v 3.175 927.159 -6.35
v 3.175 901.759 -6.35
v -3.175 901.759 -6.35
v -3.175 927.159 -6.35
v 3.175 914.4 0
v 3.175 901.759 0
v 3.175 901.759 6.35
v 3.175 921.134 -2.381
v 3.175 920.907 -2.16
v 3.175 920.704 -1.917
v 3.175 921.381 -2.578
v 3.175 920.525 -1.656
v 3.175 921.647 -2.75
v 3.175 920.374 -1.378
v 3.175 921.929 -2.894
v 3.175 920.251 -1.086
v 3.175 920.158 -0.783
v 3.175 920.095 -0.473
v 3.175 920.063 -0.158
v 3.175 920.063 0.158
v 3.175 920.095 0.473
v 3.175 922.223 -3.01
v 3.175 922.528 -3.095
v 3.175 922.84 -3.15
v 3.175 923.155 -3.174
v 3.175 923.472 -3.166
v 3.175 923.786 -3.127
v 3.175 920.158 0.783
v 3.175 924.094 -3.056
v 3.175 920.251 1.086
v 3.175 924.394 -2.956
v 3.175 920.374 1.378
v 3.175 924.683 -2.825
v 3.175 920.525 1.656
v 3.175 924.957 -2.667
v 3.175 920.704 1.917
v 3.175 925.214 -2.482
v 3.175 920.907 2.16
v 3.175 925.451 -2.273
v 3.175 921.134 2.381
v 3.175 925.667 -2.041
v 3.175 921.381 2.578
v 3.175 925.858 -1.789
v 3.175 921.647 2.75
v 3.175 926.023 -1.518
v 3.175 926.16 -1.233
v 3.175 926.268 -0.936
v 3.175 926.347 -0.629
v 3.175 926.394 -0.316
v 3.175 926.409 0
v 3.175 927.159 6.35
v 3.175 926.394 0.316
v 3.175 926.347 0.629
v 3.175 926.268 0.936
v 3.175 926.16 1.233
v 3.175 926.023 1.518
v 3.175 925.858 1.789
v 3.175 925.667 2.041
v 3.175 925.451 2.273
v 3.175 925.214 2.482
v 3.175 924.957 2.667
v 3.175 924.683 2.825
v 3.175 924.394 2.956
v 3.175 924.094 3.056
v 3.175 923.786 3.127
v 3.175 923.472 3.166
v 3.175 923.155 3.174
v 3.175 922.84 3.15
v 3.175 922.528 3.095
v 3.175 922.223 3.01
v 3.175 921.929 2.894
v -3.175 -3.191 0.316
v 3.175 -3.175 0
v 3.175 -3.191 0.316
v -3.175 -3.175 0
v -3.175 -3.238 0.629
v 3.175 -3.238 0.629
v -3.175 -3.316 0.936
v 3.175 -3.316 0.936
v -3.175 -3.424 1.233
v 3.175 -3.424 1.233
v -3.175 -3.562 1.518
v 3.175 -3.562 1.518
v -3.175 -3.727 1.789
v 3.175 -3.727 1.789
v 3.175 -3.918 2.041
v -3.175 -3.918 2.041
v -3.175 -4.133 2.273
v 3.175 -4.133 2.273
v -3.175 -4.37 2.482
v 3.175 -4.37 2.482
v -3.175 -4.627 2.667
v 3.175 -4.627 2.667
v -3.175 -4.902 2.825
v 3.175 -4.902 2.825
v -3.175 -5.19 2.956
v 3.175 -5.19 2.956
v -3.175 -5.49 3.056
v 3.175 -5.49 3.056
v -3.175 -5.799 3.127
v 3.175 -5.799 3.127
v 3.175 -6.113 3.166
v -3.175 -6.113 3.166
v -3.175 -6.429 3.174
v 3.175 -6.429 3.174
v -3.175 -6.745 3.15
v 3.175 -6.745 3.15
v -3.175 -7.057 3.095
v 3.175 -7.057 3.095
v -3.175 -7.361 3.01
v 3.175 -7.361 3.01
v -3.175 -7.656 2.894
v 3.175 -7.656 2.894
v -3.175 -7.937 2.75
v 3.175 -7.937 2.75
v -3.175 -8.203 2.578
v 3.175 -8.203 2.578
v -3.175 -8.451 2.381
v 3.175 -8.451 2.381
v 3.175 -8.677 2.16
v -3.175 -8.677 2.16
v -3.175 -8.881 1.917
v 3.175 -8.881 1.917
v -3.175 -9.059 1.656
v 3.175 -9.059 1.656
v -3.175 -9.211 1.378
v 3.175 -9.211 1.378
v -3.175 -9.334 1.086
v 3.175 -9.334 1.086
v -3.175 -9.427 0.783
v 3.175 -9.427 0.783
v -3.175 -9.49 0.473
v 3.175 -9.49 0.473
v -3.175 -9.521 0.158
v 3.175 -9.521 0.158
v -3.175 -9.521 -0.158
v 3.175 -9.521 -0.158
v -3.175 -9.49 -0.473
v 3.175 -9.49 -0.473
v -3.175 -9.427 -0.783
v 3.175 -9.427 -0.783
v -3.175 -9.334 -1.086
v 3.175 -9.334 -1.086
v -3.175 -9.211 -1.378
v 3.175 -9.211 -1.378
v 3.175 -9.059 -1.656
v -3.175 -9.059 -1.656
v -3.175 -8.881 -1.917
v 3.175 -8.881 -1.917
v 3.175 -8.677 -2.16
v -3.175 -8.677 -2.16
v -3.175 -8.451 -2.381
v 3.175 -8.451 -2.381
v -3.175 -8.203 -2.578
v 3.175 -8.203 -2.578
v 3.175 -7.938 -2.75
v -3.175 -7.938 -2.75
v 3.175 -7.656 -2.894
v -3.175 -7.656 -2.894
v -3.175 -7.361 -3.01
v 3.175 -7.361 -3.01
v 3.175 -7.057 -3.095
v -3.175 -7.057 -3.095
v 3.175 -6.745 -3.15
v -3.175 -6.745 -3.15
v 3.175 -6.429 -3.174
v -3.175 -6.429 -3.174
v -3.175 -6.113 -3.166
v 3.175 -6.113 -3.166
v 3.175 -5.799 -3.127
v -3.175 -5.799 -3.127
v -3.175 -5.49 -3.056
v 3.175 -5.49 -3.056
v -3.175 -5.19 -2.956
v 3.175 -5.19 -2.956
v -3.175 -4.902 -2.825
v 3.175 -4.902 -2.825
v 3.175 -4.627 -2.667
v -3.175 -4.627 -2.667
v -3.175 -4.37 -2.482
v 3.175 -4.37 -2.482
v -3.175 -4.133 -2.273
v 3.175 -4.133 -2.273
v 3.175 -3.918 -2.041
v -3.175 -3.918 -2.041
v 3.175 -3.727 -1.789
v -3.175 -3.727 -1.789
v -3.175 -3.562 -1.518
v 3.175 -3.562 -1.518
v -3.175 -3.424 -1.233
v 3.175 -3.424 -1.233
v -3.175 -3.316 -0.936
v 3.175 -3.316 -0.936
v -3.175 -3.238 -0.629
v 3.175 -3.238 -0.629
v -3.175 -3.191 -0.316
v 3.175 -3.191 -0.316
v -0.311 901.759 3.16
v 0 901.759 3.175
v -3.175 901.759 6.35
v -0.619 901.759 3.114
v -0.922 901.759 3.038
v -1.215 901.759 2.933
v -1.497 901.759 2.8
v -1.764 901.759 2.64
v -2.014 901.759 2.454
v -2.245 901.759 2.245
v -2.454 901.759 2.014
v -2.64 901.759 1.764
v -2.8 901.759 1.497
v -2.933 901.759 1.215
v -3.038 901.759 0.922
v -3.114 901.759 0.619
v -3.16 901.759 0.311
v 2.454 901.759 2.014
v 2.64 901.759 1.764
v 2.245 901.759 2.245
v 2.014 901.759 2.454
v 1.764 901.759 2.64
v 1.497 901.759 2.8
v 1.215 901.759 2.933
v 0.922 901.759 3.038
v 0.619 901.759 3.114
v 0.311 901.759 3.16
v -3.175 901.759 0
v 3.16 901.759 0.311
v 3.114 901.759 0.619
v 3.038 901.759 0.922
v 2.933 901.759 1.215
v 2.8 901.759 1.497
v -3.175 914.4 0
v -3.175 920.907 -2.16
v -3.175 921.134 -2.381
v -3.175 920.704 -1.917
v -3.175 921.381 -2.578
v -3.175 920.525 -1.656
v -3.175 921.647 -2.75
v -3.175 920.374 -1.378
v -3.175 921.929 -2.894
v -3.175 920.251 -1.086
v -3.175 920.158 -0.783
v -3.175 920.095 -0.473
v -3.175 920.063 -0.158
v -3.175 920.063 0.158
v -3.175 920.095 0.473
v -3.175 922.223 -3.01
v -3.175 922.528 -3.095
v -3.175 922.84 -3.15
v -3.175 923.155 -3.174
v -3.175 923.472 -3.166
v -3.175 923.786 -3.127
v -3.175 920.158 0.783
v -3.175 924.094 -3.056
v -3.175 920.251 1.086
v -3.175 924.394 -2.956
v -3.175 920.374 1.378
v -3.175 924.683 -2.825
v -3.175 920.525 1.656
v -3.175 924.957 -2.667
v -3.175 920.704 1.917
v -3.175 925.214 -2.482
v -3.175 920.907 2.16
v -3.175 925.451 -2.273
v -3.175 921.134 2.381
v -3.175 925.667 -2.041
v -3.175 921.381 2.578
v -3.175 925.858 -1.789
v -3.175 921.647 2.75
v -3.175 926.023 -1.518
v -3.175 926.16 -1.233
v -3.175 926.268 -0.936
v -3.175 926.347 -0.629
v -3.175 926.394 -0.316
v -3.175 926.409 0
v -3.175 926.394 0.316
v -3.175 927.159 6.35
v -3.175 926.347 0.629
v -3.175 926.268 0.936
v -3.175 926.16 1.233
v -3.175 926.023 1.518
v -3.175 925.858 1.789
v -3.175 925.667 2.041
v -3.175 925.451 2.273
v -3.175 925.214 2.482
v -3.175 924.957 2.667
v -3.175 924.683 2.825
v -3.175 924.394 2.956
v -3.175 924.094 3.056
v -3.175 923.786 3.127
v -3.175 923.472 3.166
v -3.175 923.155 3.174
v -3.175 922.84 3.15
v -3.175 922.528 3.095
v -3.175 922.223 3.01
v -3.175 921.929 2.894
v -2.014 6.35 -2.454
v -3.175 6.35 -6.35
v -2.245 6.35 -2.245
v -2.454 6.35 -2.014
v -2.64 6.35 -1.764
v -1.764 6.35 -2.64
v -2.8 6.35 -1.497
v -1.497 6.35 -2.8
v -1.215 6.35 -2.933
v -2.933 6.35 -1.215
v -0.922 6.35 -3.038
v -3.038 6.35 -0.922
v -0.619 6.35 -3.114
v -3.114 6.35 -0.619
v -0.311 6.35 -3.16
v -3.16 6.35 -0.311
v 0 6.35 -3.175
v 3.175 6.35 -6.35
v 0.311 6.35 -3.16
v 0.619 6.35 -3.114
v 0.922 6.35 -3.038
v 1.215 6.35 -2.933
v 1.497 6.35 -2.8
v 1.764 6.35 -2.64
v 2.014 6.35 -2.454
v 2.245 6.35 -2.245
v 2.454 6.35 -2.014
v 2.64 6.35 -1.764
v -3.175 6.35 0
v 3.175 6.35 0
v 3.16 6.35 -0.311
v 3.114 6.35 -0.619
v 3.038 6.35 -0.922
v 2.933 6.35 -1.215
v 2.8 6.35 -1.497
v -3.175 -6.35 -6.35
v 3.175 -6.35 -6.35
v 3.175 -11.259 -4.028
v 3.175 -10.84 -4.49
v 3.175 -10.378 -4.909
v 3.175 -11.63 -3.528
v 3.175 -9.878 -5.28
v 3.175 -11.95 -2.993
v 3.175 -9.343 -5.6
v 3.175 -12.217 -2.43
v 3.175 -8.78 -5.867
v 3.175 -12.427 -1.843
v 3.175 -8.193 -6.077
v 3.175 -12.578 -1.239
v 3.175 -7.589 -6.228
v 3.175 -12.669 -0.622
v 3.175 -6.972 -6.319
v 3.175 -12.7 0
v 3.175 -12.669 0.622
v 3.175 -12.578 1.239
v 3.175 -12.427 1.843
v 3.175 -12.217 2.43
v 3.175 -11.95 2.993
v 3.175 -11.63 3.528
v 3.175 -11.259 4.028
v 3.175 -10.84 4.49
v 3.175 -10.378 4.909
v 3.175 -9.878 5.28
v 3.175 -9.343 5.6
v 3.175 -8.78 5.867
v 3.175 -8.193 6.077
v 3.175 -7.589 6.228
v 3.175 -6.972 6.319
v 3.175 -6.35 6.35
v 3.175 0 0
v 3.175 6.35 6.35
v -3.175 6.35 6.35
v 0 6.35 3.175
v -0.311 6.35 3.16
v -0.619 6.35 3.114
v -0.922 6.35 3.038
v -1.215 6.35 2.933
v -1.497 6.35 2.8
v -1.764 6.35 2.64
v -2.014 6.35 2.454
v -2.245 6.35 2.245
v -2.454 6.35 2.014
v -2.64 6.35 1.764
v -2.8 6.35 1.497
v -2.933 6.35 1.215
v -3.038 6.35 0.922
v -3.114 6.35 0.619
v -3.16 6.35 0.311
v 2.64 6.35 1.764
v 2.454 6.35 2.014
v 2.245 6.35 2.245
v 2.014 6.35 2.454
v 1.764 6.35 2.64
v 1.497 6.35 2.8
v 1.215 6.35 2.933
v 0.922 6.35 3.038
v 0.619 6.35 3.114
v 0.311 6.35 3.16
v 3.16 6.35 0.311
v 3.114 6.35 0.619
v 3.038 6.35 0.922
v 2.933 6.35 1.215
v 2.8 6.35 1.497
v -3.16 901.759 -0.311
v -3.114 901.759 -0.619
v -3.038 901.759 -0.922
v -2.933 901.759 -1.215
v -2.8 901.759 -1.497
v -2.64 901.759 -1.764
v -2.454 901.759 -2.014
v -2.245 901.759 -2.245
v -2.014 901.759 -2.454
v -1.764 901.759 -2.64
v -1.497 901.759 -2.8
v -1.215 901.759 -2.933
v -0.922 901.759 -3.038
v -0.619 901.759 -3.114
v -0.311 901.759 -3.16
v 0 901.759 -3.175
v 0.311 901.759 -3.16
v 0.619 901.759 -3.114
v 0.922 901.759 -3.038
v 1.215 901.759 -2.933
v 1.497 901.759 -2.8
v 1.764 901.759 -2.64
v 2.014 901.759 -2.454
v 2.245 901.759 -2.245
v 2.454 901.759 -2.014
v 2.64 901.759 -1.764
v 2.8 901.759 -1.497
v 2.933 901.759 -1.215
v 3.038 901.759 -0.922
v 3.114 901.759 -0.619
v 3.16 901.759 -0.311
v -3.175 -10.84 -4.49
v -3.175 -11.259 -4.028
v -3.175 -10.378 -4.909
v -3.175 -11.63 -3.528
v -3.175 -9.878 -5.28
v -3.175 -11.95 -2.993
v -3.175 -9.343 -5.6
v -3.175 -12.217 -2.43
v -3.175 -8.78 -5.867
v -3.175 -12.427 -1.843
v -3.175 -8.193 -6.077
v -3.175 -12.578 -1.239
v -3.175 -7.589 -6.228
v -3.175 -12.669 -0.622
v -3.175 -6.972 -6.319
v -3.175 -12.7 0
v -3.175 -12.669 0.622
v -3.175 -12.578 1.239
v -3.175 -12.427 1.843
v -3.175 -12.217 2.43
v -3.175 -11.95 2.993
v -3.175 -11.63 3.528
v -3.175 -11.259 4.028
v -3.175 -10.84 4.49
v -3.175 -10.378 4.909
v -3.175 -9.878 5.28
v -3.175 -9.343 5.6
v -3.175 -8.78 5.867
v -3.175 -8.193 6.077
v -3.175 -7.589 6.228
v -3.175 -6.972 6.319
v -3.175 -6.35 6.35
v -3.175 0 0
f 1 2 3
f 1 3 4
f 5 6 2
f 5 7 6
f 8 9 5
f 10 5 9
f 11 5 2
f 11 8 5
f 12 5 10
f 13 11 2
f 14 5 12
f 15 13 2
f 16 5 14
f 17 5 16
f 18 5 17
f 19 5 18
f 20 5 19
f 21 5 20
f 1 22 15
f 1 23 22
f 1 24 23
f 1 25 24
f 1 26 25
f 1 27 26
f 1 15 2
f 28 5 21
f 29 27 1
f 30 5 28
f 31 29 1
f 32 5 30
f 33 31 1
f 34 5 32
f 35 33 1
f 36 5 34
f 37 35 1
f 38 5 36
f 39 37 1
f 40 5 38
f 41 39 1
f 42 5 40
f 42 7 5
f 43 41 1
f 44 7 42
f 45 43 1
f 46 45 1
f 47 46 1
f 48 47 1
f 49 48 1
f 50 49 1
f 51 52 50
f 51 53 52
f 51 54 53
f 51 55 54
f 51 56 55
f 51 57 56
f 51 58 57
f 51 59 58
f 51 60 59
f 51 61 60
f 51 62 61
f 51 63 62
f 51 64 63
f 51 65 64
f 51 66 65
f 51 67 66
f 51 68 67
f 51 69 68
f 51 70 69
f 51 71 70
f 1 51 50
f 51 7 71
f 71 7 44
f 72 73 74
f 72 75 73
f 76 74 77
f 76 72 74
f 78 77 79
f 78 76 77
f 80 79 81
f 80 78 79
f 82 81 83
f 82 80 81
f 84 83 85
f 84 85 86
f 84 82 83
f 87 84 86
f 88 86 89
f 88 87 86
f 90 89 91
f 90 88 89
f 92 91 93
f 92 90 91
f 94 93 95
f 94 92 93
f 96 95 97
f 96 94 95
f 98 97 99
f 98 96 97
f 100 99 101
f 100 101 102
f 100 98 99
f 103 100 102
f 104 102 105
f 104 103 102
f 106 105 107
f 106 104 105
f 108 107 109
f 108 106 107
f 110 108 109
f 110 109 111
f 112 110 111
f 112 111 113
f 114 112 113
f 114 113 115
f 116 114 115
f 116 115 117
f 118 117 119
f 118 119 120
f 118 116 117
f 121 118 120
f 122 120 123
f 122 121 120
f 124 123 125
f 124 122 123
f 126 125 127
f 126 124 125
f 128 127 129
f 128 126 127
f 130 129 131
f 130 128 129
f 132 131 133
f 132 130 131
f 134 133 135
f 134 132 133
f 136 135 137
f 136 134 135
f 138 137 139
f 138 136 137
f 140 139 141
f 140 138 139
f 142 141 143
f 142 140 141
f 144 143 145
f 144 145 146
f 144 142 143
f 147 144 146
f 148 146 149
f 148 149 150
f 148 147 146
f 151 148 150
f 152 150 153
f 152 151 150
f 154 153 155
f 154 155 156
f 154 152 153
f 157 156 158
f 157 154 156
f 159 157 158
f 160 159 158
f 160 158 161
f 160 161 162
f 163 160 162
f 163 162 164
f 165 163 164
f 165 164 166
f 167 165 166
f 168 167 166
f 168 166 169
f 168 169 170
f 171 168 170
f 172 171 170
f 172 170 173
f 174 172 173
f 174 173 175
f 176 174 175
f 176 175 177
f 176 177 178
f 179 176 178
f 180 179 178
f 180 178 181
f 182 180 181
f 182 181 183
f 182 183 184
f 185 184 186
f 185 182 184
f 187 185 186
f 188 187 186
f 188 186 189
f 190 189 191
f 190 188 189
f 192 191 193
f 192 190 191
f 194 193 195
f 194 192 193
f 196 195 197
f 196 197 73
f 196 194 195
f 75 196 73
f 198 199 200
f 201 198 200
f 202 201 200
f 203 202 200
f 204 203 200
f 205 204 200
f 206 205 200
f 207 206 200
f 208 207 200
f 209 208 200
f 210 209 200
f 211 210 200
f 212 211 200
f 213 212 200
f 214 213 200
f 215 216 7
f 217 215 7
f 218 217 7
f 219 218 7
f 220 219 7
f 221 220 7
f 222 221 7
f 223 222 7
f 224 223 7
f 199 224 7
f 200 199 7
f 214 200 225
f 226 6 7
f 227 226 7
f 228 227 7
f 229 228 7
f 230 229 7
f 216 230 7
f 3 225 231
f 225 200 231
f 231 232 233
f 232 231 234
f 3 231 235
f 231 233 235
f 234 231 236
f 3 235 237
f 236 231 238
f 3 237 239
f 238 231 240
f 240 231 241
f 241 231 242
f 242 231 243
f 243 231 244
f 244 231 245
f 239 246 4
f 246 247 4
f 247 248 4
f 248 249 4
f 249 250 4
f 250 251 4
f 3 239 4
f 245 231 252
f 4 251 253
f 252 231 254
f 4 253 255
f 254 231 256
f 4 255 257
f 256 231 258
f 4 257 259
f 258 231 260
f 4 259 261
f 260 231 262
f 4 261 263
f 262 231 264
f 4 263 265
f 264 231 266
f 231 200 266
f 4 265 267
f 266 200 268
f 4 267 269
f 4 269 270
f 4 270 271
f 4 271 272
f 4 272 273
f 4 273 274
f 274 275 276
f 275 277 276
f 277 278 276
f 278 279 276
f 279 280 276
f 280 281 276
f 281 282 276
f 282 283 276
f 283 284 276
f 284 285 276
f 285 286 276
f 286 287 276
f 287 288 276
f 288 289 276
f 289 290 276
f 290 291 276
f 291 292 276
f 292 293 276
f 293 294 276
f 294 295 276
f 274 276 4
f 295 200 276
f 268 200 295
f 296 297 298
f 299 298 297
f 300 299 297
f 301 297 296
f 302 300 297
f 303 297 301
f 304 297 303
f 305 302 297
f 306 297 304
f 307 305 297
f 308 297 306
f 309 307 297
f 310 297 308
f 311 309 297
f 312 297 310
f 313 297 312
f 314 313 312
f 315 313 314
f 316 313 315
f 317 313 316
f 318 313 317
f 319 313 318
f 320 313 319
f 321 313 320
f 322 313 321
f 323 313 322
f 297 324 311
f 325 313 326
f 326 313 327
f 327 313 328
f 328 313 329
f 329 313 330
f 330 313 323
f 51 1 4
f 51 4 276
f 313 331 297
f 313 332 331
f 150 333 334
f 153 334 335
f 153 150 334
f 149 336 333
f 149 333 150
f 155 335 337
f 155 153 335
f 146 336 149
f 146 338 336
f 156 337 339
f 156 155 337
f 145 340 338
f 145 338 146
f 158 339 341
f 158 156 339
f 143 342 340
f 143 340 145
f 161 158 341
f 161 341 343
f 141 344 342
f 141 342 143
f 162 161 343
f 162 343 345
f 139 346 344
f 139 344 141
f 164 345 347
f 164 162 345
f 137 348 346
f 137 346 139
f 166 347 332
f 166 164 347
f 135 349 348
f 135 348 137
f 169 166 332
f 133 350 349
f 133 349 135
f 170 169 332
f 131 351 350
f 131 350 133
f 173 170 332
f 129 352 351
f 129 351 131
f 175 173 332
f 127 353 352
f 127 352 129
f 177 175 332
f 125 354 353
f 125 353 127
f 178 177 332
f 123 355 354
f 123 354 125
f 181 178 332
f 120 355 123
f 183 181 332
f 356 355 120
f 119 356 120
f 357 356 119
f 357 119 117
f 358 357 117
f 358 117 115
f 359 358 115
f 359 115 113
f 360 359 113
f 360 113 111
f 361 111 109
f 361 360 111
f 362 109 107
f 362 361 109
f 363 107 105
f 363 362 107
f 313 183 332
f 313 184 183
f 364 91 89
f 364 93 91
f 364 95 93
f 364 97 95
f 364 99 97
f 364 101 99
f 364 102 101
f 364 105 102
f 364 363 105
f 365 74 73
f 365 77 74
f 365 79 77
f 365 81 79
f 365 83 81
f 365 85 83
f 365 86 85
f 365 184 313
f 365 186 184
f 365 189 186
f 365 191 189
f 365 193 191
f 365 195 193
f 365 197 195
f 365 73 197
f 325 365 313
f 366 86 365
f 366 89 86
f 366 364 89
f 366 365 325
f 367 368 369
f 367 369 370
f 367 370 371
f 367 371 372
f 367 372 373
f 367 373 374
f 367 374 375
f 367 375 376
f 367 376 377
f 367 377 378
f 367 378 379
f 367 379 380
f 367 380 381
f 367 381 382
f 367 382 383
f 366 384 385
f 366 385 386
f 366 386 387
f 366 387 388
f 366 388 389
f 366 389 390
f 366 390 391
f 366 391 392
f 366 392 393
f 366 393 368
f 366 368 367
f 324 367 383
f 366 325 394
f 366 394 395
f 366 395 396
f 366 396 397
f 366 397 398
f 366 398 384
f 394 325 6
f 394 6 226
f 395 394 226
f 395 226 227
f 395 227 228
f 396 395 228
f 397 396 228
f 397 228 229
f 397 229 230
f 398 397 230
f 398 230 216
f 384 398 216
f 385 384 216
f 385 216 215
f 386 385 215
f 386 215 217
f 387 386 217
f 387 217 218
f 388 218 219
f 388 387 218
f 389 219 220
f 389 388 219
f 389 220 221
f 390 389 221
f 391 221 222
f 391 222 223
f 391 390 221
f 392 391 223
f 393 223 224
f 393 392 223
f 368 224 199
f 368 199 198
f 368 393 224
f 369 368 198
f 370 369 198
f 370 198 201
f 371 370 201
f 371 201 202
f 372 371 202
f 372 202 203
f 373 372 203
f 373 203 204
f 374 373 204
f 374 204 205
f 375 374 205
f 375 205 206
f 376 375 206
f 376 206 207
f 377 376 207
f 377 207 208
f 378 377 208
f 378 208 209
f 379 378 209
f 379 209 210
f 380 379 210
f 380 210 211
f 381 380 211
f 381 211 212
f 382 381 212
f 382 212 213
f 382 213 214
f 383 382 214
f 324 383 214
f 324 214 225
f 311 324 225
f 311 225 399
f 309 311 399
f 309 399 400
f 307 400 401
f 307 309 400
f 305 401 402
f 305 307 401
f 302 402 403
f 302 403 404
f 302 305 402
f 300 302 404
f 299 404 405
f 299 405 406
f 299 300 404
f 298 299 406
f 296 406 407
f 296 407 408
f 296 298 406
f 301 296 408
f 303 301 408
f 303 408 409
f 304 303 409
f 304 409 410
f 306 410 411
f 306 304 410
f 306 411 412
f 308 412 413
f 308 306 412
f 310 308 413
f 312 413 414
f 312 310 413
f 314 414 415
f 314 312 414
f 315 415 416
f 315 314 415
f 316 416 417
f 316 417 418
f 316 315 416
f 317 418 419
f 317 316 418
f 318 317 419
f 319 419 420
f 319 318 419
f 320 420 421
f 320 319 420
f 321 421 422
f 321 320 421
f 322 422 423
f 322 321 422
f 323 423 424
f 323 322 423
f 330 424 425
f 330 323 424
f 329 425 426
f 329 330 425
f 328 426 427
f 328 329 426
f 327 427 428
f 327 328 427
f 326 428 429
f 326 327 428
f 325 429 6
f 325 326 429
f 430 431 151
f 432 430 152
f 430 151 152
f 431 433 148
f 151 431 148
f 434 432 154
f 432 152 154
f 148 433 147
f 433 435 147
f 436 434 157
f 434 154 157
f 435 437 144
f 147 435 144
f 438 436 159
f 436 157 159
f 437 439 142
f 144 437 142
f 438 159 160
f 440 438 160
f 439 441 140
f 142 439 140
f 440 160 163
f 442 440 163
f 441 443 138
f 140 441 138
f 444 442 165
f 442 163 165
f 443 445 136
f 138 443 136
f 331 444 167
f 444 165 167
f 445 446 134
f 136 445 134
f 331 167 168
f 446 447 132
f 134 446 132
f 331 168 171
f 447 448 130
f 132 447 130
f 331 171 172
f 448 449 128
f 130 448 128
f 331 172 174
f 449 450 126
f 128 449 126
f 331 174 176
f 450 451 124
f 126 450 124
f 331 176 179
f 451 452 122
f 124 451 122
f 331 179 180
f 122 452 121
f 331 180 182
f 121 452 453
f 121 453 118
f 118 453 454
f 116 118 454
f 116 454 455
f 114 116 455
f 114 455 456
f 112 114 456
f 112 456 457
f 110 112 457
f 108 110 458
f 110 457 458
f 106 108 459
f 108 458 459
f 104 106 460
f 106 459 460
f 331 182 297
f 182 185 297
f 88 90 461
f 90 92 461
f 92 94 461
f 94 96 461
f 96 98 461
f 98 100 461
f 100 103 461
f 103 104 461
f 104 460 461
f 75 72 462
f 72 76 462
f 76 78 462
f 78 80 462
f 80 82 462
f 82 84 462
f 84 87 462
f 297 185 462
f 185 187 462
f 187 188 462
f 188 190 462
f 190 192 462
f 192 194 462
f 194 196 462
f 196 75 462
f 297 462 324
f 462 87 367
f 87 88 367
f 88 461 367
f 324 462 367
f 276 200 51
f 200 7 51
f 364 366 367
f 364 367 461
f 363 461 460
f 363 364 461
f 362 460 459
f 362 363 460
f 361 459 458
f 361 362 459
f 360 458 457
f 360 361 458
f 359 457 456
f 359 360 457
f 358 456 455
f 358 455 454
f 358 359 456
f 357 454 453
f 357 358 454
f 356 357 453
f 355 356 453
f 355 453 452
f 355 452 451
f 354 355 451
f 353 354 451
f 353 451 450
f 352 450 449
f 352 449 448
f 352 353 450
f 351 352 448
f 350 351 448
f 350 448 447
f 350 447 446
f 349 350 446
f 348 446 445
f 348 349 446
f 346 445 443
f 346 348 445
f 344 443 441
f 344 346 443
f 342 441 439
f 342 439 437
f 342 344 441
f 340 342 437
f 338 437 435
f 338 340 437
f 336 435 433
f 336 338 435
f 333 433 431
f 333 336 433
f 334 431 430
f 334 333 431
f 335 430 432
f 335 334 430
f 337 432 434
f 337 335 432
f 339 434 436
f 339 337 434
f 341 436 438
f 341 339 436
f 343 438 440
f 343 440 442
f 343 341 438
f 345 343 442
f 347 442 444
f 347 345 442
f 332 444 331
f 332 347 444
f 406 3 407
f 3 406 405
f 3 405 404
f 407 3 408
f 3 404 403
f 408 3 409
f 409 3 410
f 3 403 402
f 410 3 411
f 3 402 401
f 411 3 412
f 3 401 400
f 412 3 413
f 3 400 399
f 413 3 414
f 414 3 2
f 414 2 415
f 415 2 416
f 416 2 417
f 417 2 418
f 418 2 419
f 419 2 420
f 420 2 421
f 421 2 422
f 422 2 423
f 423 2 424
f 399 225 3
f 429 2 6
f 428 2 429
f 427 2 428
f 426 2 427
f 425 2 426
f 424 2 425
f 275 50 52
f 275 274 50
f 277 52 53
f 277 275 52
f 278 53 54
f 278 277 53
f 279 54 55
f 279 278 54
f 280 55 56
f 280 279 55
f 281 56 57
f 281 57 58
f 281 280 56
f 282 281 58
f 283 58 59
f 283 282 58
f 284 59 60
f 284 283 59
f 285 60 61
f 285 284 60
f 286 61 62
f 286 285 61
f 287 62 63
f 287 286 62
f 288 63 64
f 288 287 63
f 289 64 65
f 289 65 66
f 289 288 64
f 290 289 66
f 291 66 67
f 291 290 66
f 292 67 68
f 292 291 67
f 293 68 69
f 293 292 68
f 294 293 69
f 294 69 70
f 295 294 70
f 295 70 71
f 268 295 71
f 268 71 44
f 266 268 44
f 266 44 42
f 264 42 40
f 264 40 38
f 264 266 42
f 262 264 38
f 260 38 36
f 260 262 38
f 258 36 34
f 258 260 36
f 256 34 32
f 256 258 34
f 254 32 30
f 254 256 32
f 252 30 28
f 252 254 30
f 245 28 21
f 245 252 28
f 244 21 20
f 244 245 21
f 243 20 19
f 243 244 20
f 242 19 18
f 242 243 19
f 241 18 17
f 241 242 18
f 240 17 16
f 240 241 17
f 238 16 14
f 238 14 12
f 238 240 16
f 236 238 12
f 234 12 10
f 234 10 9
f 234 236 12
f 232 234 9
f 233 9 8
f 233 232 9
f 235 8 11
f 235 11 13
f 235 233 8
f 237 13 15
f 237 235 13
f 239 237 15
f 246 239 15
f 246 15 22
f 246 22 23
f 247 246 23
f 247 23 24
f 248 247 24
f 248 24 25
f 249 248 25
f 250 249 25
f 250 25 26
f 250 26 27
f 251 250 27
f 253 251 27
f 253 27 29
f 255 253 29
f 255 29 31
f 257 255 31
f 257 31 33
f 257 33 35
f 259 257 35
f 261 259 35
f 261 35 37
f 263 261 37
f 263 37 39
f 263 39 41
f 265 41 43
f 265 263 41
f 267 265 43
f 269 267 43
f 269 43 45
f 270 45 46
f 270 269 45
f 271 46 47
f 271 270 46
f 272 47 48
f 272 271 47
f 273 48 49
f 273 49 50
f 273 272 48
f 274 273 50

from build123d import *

# Parameters (mm, degrees)
F1_R     = 3.175
F2_DEPTH = 3.175
F3_DEPTH = 3.175
F0_R     = 3.175
F4_DEPTH = 914.4
F5_W     = 25.4
F5_H     = 12.7
F5_R     = 3.175
F6_DEPTH = 3.175


with BuildPart() as f2:
    # F1 (on Right) → F2 (new body, symmetric)
    with BuildSketch(Plane.YZ):
        with BuildLine():
            ThreePointArc((-6.35, 6.35), (-12.7, 0), (-6.35, -6.35))
            ThreePointArc((-6.35, -6.35), (-1.8598719395, -4.4901280605), (0, 0))
            ThreePointArc((0, 0), (-1.8598719395, 4.4901280605), (-6.35, 6.35))
        make_face()
        with Locations((-6.35, 0)):
            Circle(F1_R, mode=Mode.SUBTRACT)
    extrude(amount=F2_DEPTH, both=True)

    # F1 (on Right) → F3 (join, symmetric)
    with BuildSketch(Plane.YZ):
        with BuildLine():
            Line((-6.35, -6.35), (6.35, -6.35))
            Line((6.35, -6.35), (6.35, 6.35))
            Line((6.35, 6.35), (-6.35, 6.35))
            ThreePointArc((-6.35, 6.35), (-1.8598719395, 4.4901280605), (0, 0))
            ThreePointArc((0, 0), (-1.8598719395, -4.4901280605), (-6.35, -6.35))
        make_face()
    extrude(amount=F3_DEPTH, both=True)

    # F0 (on Front) → F4 (join)
    with BuildSketch(Plane.XZ):
        Circle(F0_R)
    extrude(amount=-F4_DEPTH)

    # F5 (on Right) → F6 (join, symmetric)
    with BuildSketch(Plane.YZ):
        with Locations((914.4588708878, 0)):
            Rectangle(F5_W, F5_H)
        with Locations((923.234462738, 0)):
            Circle(F5_R, mode=Mode.SUBTRACT)
    extrude(amount=F6_DEPTH, both=True)


solid = f2.part
